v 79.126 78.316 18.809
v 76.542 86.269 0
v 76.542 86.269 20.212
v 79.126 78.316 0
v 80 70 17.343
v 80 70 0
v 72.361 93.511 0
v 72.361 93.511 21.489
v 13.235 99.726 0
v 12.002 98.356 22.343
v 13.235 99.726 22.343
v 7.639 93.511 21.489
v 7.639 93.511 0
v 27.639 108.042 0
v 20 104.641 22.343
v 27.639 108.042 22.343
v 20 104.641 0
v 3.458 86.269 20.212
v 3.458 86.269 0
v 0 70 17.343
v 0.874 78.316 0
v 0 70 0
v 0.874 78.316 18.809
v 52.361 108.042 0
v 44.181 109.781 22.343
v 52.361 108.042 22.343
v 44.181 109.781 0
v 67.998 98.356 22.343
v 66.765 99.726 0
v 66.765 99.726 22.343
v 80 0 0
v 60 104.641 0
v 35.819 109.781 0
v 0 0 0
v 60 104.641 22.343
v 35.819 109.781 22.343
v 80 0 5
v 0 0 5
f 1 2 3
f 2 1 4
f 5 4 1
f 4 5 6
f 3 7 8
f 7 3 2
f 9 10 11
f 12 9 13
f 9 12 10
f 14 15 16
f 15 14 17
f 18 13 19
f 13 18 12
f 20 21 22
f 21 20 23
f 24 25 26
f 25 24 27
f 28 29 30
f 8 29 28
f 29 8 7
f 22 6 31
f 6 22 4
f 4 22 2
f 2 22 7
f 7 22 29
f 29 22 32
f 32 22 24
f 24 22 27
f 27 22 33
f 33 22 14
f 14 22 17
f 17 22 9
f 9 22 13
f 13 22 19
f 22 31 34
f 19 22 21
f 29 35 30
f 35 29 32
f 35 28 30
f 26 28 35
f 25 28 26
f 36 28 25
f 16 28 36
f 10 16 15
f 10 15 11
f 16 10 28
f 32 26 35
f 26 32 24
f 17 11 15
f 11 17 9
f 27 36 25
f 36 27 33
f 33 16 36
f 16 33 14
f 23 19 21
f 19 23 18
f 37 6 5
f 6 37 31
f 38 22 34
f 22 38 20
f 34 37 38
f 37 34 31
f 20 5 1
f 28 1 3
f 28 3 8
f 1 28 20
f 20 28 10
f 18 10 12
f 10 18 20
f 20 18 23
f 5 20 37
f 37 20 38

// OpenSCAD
//Customizable Foot Wedge

//Variables
// Define the width of your heel
heel_width =80; //Numeric value of heel width 

//Define the length of the wedge past your heel
l=70; //Length of the cube

//Define the height of the front of the wedge
h=5; //Numeric value of height of insert from front of wedge

//Define the angle of the wedge
wedge_angle=10; //[0:20]

//Calculated variables
r=heel_width/2; //Radius of the Circle
total_l = r+l; //Total Length


foot_wedge();

module foot_wedge(){
difference(){
union(){
translate([r,l,0])cylinder(h*2+l*tan(wedge_angle),r,r, $fs=1);
translate([0,0,0])cube([r*2,l,h*2+l*tan(wedge_angle)]);
}
translate([-1,0,h])rotate([wedge_angle,0,0])cube([r*2+10,total_l*2,h*2+l*tan(wedge_angle)]);
translate([0,-total_l,-1])cube([r*2,total_l,(h*2+l*tan(wedge_angle))+2]);
}
}
